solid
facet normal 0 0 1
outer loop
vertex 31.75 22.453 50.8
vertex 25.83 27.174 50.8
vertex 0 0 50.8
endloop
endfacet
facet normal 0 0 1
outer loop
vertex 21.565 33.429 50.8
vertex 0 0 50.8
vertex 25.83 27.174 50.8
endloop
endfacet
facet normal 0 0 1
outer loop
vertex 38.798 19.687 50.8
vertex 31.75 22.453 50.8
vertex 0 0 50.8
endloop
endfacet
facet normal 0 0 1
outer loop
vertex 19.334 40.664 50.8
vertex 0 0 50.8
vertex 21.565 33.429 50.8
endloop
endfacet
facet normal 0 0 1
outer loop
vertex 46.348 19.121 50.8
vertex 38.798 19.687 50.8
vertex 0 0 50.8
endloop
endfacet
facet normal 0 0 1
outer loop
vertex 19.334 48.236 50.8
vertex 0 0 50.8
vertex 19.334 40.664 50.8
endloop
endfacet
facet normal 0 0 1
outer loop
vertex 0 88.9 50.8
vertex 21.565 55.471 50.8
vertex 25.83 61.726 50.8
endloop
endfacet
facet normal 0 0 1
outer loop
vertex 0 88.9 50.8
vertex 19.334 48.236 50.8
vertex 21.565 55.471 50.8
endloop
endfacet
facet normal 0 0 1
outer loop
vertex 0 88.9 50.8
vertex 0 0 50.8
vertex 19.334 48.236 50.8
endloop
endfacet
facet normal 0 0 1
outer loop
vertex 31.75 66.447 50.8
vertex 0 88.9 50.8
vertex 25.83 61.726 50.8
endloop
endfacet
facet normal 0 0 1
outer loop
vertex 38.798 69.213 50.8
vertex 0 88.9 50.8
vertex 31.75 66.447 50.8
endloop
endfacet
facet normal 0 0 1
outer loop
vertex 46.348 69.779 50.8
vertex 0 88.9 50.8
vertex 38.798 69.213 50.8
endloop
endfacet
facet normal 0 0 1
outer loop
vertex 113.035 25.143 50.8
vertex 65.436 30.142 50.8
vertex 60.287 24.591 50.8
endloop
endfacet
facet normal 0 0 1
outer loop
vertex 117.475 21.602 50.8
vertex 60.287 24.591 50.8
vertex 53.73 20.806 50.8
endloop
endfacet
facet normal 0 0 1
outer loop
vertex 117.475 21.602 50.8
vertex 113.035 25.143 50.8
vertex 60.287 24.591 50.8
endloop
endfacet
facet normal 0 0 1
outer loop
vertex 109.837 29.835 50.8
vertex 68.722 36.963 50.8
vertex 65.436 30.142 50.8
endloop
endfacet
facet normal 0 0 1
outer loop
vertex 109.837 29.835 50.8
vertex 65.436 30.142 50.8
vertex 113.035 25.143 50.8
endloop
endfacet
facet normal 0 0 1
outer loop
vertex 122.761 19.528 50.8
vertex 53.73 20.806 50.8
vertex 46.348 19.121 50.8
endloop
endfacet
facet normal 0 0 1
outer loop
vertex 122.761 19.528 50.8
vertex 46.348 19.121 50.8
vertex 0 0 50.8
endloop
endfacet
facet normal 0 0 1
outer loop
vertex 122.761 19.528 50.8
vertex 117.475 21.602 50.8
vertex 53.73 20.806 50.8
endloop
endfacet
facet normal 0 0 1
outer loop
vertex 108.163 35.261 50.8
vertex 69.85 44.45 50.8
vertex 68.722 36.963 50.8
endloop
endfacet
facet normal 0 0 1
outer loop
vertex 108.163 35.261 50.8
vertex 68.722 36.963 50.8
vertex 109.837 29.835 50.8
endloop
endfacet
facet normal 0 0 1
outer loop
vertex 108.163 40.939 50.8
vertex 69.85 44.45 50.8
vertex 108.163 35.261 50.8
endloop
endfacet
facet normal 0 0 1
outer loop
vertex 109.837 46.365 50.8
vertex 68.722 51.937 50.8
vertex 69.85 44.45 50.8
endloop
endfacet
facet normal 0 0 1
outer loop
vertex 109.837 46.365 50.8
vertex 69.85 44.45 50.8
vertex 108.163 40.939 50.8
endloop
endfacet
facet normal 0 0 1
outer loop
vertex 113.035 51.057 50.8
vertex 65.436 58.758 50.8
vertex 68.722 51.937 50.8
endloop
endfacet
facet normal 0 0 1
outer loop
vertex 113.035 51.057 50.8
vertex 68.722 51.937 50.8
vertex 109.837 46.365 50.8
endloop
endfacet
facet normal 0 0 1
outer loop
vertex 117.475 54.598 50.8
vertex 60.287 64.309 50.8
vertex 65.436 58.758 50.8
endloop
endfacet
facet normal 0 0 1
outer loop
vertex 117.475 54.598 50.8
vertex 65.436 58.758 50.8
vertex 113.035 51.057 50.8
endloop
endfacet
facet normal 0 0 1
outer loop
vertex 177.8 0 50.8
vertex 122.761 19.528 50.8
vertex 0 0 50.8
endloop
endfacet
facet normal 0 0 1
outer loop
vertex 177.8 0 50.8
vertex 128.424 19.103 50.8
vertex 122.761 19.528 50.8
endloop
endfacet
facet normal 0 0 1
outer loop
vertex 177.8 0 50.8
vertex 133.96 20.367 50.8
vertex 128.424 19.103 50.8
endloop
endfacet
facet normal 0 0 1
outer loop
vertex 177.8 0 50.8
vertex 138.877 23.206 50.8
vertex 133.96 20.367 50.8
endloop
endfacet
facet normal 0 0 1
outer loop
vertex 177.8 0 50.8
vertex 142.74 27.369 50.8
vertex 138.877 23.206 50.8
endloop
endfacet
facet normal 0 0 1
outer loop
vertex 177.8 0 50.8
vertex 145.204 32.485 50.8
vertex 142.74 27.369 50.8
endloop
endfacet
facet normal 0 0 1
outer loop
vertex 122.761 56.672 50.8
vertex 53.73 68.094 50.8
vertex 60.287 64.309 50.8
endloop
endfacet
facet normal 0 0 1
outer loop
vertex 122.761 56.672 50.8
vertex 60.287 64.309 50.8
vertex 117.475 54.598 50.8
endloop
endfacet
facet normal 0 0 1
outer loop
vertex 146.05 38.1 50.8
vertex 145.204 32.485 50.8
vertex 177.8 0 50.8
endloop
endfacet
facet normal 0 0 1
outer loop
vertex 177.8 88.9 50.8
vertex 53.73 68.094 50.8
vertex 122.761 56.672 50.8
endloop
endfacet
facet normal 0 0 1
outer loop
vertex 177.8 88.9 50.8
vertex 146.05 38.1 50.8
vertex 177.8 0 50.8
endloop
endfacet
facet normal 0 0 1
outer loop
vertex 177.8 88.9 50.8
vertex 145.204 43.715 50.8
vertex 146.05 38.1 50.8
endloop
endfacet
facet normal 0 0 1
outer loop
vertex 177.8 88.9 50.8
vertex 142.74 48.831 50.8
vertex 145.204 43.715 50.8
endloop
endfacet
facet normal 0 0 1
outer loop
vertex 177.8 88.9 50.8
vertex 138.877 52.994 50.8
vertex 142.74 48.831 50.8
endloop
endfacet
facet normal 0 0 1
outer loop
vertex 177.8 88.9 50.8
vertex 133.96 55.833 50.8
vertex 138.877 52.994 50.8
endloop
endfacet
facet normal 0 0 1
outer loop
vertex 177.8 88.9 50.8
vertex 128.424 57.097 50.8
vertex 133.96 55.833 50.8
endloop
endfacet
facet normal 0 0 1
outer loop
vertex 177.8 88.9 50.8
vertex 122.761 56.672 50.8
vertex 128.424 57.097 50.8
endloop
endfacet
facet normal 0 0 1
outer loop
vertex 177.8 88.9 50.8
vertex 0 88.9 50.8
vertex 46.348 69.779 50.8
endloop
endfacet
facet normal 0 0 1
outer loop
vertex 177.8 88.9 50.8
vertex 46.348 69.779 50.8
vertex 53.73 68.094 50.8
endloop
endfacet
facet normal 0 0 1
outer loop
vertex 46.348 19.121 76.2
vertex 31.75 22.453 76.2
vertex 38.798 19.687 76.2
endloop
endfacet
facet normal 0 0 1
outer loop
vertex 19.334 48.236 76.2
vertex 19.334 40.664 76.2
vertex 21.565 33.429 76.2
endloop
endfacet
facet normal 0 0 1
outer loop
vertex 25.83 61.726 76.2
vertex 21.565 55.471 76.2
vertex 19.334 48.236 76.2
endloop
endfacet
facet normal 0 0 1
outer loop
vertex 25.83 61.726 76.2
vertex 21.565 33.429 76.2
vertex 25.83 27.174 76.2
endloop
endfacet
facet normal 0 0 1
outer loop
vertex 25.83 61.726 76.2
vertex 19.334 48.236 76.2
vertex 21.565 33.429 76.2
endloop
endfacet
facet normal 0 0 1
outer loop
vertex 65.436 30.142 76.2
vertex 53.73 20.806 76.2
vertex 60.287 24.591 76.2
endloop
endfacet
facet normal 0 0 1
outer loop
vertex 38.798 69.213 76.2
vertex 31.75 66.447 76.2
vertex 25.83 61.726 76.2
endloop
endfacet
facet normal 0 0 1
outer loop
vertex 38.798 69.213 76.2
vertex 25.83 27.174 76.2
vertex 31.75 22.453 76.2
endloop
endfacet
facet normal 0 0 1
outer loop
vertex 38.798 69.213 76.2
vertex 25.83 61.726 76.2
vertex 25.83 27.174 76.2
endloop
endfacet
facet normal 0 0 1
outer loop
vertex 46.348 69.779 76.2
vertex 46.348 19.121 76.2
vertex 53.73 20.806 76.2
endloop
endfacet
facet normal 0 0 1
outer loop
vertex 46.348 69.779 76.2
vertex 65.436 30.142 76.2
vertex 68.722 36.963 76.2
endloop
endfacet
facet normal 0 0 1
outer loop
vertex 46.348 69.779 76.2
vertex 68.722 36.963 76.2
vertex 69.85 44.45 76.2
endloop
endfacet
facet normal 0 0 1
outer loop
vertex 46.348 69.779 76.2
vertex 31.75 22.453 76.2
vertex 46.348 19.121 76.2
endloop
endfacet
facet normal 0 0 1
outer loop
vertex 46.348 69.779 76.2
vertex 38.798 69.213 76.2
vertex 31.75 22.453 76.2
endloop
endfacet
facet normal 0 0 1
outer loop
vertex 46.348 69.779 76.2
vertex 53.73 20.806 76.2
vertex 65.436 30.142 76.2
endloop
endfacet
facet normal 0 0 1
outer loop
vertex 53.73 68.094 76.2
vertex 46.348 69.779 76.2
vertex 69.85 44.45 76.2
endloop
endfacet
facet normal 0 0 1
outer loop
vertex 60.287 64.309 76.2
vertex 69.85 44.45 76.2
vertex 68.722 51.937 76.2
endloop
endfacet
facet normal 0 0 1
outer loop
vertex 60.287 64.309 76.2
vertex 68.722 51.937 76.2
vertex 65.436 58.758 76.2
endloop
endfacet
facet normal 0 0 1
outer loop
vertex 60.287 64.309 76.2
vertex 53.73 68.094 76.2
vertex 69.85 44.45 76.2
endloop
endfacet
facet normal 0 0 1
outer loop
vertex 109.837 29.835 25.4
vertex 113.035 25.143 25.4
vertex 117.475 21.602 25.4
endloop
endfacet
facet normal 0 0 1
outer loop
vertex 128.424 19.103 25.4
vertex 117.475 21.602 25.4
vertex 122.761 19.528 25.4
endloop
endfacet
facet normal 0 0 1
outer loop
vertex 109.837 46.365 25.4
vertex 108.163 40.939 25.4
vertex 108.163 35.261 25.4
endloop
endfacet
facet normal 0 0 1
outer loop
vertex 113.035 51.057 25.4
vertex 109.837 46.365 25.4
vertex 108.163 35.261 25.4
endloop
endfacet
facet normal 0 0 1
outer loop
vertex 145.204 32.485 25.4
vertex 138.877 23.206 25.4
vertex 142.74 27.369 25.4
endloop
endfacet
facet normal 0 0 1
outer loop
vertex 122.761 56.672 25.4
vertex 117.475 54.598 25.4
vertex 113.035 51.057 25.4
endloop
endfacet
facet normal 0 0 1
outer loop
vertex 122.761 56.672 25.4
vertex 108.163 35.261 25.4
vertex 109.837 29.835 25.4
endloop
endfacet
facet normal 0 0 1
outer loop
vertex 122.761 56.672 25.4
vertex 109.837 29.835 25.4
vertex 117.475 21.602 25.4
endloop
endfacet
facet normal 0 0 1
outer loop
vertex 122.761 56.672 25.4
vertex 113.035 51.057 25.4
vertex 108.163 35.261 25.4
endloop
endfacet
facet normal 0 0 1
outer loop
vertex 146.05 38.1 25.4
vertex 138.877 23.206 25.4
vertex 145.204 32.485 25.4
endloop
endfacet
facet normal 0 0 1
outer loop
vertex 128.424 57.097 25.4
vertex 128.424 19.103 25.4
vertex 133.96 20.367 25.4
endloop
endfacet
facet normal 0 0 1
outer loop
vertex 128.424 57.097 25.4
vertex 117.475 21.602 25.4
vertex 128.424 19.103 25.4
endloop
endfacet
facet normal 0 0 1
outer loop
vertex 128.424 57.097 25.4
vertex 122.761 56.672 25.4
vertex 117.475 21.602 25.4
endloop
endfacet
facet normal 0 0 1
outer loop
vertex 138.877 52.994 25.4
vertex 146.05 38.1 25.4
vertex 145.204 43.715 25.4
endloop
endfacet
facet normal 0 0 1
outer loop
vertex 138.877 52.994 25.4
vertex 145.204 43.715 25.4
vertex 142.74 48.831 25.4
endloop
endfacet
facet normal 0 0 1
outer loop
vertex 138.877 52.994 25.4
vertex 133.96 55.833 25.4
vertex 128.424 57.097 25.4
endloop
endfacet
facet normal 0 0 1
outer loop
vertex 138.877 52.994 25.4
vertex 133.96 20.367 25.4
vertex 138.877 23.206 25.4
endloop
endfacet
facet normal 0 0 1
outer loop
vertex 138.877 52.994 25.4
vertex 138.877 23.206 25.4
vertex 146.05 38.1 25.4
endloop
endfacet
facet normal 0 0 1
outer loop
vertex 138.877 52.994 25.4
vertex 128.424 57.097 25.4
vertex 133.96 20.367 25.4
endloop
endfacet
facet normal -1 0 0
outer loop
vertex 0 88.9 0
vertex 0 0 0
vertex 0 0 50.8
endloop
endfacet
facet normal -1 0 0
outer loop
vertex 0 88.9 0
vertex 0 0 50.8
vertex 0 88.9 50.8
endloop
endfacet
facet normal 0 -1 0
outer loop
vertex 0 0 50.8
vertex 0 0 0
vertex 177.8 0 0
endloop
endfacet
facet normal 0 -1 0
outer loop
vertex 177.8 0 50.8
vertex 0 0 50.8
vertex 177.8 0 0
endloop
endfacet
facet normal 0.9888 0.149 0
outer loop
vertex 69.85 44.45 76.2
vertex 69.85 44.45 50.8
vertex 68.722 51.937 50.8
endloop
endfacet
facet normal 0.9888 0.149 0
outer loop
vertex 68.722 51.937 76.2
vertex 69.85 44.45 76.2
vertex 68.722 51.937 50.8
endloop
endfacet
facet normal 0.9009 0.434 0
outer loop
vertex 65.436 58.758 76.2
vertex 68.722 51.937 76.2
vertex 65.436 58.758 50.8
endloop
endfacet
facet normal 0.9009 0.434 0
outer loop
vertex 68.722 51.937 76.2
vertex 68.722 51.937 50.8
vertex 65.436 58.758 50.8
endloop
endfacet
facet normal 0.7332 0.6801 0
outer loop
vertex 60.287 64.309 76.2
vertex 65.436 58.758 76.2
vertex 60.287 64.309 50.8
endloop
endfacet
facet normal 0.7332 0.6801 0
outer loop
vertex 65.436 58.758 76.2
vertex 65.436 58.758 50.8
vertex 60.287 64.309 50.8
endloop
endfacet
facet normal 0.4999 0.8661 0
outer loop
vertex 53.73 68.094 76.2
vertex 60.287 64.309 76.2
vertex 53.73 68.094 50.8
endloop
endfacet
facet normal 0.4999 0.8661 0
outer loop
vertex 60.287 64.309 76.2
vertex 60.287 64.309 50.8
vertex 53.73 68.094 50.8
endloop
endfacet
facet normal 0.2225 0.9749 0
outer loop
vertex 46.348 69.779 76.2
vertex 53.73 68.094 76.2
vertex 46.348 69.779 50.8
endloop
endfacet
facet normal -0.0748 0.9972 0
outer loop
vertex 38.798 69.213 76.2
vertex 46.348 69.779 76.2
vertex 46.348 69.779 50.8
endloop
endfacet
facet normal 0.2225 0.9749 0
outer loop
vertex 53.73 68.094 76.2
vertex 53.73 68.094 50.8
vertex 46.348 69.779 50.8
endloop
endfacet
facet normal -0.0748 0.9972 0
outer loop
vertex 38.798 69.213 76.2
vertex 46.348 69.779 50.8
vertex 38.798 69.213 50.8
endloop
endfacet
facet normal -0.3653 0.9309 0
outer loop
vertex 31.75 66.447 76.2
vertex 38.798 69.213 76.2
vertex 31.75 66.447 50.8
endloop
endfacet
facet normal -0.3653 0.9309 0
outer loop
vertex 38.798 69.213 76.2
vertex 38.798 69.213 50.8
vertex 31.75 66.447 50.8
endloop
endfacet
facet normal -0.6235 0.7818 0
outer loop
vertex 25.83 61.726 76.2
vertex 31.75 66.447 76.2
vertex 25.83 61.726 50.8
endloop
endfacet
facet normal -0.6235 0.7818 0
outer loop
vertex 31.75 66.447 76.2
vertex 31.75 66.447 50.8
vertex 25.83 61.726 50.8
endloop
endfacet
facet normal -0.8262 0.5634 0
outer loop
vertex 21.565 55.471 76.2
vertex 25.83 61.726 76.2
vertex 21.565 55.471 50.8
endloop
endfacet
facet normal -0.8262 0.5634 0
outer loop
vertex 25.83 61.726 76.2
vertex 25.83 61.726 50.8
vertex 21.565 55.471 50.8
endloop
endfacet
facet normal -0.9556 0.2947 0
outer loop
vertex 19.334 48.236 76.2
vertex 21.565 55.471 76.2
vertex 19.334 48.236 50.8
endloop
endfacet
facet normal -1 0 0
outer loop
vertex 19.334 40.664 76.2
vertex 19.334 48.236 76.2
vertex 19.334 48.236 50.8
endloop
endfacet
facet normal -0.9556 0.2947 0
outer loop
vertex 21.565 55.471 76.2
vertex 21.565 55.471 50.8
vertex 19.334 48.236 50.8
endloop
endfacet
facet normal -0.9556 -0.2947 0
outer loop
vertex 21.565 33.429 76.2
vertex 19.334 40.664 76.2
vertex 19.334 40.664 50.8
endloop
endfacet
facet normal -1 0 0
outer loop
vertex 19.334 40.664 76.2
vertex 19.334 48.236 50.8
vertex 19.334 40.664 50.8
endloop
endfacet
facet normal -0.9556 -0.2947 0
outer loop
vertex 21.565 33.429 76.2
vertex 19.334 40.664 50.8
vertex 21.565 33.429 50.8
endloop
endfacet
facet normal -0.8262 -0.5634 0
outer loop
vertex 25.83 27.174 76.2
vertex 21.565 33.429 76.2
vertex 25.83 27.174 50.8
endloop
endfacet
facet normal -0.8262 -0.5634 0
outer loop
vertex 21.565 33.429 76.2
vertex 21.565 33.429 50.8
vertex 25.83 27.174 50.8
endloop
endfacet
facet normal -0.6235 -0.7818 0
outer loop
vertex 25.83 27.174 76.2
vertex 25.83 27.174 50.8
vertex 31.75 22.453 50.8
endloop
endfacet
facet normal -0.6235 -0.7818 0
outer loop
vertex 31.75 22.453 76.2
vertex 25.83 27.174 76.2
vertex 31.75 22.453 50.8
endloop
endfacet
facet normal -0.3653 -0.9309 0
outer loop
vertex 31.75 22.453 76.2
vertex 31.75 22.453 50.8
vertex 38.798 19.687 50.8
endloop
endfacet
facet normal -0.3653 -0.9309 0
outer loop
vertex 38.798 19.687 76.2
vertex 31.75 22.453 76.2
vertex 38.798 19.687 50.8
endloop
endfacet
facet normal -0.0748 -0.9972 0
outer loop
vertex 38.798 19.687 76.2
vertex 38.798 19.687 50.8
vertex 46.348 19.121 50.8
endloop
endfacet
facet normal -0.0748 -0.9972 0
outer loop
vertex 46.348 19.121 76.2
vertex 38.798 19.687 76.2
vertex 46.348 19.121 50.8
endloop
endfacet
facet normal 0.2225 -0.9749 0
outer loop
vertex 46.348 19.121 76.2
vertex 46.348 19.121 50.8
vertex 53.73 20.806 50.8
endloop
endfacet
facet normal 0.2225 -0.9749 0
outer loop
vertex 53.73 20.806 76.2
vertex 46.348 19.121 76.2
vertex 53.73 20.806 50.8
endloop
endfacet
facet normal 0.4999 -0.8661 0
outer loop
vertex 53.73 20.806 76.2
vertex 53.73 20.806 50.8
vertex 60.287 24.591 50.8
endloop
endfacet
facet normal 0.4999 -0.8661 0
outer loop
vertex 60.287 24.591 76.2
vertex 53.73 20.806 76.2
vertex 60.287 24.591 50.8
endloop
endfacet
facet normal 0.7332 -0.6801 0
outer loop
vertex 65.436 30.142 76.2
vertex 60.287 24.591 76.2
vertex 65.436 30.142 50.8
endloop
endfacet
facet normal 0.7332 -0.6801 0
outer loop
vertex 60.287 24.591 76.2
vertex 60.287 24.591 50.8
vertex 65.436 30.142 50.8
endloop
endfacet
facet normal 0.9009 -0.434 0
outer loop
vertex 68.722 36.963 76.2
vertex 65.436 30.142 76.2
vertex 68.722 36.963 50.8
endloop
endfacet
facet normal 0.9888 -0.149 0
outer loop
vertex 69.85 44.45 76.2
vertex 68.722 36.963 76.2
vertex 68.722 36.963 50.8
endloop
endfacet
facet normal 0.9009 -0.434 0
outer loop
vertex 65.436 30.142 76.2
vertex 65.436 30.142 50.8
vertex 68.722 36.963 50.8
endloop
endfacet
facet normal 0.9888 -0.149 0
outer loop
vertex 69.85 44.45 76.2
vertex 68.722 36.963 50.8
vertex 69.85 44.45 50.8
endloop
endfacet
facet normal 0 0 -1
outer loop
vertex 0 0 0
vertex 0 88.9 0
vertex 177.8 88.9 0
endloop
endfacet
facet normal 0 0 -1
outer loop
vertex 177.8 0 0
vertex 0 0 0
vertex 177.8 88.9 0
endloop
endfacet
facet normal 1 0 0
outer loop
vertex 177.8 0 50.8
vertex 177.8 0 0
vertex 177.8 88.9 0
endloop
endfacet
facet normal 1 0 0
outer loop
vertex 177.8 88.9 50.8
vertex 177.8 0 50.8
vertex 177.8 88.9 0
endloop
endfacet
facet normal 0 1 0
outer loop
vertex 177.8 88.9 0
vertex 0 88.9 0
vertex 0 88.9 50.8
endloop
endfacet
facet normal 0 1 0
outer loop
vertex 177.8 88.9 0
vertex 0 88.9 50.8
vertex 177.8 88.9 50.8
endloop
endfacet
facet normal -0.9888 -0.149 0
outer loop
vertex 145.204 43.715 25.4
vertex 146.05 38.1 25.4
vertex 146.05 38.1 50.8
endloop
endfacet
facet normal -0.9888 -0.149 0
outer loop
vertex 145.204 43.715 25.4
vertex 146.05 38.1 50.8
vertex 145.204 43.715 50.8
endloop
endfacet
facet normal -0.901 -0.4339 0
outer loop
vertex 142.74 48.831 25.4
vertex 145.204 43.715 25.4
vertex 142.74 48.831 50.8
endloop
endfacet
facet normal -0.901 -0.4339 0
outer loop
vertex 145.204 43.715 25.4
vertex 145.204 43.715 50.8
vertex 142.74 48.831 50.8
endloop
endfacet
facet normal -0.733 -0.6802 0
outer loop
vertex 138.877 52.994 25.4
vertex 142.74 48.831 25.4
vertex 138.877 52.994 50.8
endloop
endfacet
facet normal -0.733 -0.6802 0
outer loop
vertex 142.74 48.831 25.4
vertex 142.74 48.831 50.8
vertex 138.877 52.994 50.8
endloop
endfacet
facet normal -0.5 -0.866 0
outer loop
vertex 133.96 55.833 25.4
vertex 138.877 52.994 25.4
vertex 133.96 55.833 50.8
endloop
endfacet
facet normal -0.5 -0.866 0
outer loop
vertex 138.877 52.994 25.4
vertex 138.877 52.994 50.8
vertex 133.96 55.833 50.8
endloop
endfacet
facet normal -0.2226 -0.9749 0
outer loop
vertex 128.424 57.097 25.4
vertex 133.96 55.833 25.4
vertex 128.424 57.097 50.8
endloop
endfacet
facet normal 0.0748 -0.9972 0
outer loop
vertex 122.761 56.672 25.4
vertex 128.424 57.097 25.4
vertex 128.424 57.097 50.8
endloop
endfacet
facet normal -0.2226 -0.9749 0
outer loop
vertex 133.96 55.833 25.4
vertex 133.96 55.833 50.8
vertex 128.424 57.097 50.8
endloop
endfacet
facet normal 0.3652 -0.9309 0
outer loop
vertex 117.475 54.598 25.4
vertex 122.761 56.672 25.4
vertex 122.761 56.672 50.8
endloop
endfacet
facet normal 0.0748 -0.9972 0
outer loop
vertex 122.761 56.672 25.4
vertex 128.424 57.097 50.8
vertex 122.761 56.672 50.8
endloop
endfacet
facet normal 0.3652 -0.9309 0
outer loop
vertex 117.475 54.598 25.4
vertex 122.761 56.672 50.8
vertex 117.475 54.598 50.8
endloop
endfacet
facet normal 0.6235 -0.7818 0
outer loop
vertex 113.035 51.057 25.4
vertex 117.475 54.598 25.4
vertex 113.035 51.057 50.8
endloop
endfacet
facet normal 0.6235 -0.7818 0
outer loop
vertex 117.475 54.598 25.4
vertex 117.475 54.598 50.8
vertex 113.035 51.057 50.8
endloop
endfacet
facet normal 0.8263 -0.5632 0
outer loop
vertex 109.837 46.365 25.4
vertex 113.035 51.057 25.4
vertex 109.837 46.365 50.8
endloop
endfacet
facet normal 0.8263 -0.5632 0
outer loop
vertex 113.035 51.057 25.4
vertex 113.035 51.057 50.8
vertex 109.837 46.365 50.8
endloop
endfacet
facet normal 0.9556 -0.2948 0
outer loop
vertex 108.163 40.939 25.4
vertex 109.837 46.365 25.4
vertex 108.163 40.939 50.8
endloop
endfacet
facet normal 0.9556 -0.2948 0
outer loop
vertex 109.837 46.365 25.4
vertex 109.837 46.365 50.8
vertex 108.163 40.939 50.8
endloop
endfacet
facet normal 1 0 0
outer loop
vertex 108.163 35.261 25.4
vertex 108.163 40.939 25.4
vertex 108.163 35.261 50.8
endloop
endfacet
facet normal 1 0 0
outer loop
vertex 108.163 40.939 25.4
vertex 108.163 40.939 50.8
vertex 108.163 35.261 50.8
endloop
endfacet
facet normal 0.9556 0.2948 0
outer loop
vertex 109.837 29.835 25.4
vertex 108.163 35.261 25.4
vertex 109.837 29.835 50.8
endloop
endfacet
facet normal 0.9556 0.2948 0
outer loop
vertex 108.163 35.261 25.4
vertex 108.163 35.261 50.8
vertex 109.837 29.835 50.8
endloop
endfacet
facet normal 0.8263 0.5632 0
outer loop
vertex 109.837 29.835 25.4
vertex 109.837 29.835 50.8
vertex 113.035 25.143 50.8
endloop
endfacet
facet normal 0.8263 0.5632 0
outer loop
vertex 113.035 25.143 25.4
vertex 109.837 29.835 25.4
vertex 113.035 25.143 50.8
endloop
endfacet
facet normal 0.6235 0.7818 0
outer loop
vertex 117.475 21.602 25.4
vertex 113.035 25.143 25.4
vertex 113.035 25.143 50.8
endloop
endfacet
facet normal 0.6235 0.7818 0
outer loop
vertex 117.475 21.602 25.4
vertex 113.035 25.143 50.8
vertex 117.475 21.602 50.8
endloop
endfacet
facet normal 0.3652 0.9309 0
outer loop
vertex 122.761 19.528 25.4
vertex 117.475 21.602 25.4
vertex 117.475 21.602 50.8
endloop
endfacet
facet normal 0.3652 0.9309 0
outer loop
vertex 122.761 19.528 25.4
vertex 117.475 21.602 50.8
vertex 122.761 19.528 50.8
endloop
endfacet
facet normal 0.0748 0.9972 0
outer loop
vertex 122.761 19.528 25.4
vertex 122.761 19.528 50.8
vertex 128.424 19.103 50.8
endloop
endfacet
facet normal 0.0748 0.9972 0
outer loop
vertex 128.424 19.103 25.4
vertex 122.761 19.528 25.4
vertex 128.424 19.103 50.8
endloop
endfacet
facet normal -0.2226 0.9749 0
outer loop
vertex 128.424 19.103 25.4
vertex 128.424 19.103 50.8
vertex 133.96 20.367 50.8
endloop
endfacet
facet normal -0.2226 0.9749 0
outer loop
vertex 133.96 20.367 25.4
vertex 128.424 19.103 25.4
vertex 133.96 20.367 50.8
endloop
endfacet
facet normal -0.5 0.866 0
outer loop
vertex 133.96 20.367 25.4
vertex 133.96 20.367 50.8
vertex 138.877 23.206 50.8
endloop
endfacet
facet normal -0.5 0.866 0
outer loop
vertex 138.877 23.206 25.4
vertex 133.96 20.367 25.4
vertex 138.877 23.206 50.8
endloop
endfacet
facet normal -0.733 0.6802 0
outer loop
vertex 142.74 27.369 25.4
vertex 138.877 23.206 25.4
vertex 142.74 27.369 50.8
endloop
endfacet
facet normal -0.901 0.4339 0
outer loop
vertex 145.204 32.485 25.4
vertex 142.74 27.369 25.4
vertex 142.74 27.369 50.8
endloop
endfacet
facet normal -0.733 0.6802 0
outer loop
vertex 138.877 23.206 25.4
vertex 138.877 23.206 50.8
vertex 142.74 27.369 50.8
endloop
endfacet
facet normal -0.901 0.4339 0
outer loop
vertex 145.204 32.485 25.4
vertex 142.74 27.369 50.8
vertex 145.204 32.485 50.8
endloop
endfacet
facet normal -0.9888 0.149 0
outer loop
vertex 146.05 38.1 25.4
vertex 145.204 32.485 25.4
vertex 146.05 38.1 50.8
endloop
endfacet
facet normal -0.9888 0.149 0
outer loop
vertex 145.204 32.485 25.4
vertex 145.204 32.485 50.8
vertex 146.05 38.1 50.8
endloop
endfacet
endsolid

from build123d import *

# Parameters (mm, degrees)
F0_W     = 177.8
F0_H     = 88.9
F1_DEPTH = 50.8
F2_R     = 25.4
F3_DEPTH = 25.4
F4_R     = 19.05
F5_DEPTH = 25.4


with BuildPart() as f1:
    # F0 (on Top) → F1 (new body)
    with BuildSketch(Plane.XY):
        with Locations((88.9, 44.45)):
            Rectangle(F0_W, F0_H)
    extrude(amount=F1_DEPTH)

    # F2 (on face) → F3 (join)
    with BuildSketch(Plane.XY.offset(50.8)):
        with Locations((44.45, 44.45)):
            Circle(F2_R)
    extrude(amount=F3_DEPTH)

    # F4 (on face) → F5 (cut)
    with BuildSketch(Plane.XY.offset(50.8)):
        with Locations((127, 38.1)):
            Circle(F4_R)
    extrude(amount=-F5_DEPTH, mode=Mode.SUBTRACT)


solid = f1.part
